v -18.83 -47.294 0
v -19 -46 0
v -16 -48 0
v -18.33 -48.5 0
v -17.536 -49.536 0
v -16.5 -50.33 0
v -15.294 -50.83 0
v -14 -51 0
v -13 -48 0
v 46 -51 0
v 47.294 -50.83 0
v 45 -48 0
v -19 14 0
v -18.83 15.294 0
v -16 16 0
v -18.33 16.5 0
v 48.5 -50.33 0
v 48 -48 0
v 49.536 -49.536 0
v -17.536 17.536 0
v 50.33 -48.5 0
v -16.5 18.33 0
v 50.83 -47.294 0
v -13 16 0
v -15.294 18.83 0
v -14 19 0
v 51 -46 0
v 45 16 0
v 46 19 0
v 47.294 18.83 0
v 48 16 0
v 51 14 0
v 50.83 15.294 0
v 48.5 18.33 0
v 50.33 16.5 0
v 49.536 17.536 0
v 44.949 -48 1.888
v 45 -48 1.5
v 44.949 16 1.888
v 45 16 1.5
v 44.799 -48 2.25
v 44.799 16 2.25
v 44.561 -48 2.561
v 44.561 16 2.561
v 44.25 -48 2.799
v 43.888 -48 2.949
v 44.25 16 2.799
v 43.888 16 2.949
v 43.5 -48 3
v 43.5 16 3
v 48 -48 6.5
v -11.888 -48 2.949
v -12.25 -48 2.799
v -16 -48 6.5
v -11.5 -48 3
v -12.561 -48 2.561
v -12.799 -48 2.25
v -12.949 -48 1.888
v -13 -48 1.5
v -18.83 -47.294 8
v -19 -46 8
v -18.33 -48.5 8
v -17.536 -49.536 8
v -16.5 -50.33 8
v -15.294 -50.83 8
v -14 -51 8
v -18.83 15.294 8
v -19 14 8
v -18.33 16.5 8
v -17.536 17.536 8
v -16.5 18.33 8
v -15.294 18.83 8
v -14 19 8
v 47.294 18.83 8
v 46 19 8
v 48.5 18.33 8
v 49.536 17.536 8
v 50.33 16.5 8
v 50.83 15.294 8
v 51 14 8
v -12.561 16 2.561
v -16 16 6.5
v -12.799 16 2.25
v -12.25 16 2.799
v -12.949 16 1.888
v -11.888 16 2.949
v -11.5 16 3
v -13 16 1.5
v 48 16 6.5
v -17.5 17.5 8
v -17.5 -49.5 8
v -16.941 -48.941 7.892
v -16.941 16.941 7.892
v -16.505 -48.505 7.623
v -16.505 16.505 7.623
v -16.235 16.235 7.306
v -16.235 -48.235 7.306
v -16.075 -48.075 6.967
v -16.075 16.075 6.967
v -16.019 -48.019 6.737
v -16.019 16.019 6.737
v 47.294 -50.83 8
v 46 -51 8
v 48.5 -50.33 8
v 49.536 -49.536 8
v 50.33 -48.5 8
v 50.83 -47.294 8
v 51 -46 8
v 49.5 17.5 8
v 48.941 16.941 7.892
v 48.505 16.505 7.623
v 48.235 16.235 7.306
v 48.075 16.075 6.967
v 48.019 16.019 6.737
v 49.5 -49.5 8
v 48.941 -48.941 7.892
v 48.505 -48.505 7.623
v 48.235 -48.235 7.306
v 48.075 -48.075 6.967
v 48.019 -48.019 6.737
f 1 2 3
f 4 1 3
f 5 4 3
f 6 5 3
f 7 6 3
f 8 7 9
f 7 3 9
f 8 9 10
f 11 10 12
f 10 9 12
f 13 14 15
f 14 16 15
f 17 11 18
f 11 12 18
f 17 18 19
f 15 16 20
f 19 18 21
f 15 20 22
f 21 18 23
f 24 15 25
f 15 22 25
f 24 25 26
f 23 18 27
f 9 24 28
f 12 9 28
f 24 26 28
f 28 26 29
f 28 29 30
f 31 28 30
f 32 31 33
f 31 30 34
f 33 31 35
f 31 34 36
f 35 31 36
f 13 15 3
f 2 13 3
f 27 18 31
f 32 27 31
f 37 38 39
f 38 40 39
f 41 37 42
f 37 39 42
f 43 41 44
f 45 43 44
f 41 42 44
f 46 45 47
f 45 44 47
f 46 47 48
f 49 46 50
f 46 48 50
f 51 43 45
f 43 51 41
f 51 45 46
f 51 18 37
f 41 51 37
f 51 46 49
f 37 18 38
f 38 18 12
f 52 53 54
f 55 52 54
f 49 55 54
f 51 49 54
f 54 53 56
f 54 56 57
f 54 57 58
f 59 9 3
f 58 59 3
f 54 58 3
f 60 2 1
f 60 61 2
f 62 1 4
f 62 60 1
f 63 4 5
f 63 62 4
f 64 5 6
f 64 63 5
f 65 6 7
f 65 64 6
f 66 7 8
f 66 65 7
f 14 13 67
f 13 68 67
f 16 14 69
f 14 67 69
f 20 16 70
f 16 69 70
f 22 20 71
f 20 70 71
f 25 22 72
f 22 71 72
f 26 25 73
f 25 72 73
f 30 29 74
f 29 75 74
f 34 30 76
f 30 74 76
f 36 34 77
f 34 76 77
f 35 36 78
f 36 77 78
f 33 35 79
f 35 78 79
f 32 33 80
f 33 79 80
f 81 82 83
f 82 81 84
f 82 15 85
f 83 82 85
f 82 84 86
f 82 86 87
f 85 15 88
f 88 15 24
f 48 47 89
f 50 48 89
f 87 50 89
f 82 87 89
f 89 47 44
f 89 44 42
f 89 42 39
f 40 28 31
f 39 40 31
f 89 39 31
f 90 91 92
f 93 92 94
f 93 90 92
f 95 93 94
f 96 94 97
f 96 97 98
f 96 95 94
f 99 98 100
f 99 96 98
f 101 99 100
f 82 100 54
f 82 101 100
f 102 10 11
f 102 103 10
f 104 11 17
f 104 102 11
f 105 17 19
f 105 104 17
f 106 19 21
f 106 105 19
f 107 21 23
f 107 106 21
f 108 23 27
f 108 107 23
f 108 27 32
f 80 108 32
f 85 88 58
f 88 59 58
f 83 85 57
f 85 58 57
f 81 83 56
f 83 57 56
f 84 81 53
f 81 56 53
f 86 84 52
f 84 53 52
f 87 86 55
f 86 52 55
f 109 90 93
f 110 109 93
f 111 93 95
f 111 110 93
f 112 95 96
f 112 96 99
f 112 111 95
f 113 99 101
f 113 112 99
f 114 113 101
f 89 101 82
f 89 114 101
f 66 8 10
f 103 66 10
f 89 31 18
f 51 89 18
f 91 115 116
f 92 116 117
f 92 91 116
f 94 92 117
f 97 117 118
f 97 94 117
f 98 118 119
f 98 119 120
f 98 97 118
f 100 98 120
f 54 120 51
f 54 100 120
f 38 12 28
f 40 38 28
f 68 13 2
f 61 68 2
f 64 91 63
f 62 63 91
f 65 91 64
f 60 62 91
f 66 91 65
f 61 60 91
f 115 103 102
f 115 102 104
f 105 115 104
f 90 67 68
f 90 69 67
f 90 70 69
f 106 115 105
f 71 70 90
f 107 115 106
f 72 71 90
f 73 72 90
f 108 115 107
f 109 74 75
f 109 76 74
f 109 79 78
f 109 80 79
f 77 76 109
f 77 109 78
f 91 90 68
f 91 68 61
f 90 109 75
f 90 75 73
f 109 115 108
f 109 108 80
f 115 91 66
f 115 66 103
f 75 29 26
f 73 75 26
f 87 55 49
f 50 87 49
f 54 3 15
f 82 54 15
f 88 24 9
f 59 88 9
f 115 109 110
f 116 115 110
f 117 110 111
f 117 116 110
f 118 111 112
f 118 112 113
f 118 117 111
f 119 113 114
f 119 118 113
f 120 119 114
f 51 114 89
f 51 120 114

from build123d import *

# Parameters (mm, degrees)
F1_DEPTH = 3
F2_DEPTH = 8
F3_R     = 5
F4_R     = 1.5


with BuildPart() as f1:
    # F0 (on Top) → F1 (new body)
    with BuildSketch(Plane.XY):
        Polygon((45, 16), (16, 16), (-13, 16), (-13, -16), (-13, -48), (16, -48), (45, -48), (45, -16), align=None)
    extrude(amount=F1_DEPTH)

    # F0 (on Top) → F2 (join)
    with BuildSketch(Plane.XY):
        Polygon((-13, 16), (16, 16), (16, 19), (-19, 19), (-19, -16), (-16, -16), (-16, 16), align=None)
        Polygon((16, 19), (16, 16), (45, 16), (48, 16), (48, -16), (48, -48), (45, -48), (16, -48), (-13, -48), (-16, -48), (-16, -16), (-19, -16), (-19, -51), (16, -51), (51, -51), (51, -16), (51, 19), align=None)
    extrude(amount=F2_DEPTH)

    # F3
    f3_edges = [f1.edges().sort_by_distance(p)[0] for p in [
        (-19, 19, 4),
        (-19, -51, 4),
        (51, -51, 4),
        (51, 19, 4),
    ]]
    fillet(f3_edges, radius=F3_R)

    # F4
    f4_edges = [f1.edges().sort_by_distance(p)[0] for p in [
        (-16, -16, 8),
        (16, 16, 8),
        (48, -16, 8),
        (16, -48, 8),
        (-13, -16, 3),
        (45, -16, 3),
    ]]
    fillet(f4_edges, radius=F4_R)


solid = f1.part
